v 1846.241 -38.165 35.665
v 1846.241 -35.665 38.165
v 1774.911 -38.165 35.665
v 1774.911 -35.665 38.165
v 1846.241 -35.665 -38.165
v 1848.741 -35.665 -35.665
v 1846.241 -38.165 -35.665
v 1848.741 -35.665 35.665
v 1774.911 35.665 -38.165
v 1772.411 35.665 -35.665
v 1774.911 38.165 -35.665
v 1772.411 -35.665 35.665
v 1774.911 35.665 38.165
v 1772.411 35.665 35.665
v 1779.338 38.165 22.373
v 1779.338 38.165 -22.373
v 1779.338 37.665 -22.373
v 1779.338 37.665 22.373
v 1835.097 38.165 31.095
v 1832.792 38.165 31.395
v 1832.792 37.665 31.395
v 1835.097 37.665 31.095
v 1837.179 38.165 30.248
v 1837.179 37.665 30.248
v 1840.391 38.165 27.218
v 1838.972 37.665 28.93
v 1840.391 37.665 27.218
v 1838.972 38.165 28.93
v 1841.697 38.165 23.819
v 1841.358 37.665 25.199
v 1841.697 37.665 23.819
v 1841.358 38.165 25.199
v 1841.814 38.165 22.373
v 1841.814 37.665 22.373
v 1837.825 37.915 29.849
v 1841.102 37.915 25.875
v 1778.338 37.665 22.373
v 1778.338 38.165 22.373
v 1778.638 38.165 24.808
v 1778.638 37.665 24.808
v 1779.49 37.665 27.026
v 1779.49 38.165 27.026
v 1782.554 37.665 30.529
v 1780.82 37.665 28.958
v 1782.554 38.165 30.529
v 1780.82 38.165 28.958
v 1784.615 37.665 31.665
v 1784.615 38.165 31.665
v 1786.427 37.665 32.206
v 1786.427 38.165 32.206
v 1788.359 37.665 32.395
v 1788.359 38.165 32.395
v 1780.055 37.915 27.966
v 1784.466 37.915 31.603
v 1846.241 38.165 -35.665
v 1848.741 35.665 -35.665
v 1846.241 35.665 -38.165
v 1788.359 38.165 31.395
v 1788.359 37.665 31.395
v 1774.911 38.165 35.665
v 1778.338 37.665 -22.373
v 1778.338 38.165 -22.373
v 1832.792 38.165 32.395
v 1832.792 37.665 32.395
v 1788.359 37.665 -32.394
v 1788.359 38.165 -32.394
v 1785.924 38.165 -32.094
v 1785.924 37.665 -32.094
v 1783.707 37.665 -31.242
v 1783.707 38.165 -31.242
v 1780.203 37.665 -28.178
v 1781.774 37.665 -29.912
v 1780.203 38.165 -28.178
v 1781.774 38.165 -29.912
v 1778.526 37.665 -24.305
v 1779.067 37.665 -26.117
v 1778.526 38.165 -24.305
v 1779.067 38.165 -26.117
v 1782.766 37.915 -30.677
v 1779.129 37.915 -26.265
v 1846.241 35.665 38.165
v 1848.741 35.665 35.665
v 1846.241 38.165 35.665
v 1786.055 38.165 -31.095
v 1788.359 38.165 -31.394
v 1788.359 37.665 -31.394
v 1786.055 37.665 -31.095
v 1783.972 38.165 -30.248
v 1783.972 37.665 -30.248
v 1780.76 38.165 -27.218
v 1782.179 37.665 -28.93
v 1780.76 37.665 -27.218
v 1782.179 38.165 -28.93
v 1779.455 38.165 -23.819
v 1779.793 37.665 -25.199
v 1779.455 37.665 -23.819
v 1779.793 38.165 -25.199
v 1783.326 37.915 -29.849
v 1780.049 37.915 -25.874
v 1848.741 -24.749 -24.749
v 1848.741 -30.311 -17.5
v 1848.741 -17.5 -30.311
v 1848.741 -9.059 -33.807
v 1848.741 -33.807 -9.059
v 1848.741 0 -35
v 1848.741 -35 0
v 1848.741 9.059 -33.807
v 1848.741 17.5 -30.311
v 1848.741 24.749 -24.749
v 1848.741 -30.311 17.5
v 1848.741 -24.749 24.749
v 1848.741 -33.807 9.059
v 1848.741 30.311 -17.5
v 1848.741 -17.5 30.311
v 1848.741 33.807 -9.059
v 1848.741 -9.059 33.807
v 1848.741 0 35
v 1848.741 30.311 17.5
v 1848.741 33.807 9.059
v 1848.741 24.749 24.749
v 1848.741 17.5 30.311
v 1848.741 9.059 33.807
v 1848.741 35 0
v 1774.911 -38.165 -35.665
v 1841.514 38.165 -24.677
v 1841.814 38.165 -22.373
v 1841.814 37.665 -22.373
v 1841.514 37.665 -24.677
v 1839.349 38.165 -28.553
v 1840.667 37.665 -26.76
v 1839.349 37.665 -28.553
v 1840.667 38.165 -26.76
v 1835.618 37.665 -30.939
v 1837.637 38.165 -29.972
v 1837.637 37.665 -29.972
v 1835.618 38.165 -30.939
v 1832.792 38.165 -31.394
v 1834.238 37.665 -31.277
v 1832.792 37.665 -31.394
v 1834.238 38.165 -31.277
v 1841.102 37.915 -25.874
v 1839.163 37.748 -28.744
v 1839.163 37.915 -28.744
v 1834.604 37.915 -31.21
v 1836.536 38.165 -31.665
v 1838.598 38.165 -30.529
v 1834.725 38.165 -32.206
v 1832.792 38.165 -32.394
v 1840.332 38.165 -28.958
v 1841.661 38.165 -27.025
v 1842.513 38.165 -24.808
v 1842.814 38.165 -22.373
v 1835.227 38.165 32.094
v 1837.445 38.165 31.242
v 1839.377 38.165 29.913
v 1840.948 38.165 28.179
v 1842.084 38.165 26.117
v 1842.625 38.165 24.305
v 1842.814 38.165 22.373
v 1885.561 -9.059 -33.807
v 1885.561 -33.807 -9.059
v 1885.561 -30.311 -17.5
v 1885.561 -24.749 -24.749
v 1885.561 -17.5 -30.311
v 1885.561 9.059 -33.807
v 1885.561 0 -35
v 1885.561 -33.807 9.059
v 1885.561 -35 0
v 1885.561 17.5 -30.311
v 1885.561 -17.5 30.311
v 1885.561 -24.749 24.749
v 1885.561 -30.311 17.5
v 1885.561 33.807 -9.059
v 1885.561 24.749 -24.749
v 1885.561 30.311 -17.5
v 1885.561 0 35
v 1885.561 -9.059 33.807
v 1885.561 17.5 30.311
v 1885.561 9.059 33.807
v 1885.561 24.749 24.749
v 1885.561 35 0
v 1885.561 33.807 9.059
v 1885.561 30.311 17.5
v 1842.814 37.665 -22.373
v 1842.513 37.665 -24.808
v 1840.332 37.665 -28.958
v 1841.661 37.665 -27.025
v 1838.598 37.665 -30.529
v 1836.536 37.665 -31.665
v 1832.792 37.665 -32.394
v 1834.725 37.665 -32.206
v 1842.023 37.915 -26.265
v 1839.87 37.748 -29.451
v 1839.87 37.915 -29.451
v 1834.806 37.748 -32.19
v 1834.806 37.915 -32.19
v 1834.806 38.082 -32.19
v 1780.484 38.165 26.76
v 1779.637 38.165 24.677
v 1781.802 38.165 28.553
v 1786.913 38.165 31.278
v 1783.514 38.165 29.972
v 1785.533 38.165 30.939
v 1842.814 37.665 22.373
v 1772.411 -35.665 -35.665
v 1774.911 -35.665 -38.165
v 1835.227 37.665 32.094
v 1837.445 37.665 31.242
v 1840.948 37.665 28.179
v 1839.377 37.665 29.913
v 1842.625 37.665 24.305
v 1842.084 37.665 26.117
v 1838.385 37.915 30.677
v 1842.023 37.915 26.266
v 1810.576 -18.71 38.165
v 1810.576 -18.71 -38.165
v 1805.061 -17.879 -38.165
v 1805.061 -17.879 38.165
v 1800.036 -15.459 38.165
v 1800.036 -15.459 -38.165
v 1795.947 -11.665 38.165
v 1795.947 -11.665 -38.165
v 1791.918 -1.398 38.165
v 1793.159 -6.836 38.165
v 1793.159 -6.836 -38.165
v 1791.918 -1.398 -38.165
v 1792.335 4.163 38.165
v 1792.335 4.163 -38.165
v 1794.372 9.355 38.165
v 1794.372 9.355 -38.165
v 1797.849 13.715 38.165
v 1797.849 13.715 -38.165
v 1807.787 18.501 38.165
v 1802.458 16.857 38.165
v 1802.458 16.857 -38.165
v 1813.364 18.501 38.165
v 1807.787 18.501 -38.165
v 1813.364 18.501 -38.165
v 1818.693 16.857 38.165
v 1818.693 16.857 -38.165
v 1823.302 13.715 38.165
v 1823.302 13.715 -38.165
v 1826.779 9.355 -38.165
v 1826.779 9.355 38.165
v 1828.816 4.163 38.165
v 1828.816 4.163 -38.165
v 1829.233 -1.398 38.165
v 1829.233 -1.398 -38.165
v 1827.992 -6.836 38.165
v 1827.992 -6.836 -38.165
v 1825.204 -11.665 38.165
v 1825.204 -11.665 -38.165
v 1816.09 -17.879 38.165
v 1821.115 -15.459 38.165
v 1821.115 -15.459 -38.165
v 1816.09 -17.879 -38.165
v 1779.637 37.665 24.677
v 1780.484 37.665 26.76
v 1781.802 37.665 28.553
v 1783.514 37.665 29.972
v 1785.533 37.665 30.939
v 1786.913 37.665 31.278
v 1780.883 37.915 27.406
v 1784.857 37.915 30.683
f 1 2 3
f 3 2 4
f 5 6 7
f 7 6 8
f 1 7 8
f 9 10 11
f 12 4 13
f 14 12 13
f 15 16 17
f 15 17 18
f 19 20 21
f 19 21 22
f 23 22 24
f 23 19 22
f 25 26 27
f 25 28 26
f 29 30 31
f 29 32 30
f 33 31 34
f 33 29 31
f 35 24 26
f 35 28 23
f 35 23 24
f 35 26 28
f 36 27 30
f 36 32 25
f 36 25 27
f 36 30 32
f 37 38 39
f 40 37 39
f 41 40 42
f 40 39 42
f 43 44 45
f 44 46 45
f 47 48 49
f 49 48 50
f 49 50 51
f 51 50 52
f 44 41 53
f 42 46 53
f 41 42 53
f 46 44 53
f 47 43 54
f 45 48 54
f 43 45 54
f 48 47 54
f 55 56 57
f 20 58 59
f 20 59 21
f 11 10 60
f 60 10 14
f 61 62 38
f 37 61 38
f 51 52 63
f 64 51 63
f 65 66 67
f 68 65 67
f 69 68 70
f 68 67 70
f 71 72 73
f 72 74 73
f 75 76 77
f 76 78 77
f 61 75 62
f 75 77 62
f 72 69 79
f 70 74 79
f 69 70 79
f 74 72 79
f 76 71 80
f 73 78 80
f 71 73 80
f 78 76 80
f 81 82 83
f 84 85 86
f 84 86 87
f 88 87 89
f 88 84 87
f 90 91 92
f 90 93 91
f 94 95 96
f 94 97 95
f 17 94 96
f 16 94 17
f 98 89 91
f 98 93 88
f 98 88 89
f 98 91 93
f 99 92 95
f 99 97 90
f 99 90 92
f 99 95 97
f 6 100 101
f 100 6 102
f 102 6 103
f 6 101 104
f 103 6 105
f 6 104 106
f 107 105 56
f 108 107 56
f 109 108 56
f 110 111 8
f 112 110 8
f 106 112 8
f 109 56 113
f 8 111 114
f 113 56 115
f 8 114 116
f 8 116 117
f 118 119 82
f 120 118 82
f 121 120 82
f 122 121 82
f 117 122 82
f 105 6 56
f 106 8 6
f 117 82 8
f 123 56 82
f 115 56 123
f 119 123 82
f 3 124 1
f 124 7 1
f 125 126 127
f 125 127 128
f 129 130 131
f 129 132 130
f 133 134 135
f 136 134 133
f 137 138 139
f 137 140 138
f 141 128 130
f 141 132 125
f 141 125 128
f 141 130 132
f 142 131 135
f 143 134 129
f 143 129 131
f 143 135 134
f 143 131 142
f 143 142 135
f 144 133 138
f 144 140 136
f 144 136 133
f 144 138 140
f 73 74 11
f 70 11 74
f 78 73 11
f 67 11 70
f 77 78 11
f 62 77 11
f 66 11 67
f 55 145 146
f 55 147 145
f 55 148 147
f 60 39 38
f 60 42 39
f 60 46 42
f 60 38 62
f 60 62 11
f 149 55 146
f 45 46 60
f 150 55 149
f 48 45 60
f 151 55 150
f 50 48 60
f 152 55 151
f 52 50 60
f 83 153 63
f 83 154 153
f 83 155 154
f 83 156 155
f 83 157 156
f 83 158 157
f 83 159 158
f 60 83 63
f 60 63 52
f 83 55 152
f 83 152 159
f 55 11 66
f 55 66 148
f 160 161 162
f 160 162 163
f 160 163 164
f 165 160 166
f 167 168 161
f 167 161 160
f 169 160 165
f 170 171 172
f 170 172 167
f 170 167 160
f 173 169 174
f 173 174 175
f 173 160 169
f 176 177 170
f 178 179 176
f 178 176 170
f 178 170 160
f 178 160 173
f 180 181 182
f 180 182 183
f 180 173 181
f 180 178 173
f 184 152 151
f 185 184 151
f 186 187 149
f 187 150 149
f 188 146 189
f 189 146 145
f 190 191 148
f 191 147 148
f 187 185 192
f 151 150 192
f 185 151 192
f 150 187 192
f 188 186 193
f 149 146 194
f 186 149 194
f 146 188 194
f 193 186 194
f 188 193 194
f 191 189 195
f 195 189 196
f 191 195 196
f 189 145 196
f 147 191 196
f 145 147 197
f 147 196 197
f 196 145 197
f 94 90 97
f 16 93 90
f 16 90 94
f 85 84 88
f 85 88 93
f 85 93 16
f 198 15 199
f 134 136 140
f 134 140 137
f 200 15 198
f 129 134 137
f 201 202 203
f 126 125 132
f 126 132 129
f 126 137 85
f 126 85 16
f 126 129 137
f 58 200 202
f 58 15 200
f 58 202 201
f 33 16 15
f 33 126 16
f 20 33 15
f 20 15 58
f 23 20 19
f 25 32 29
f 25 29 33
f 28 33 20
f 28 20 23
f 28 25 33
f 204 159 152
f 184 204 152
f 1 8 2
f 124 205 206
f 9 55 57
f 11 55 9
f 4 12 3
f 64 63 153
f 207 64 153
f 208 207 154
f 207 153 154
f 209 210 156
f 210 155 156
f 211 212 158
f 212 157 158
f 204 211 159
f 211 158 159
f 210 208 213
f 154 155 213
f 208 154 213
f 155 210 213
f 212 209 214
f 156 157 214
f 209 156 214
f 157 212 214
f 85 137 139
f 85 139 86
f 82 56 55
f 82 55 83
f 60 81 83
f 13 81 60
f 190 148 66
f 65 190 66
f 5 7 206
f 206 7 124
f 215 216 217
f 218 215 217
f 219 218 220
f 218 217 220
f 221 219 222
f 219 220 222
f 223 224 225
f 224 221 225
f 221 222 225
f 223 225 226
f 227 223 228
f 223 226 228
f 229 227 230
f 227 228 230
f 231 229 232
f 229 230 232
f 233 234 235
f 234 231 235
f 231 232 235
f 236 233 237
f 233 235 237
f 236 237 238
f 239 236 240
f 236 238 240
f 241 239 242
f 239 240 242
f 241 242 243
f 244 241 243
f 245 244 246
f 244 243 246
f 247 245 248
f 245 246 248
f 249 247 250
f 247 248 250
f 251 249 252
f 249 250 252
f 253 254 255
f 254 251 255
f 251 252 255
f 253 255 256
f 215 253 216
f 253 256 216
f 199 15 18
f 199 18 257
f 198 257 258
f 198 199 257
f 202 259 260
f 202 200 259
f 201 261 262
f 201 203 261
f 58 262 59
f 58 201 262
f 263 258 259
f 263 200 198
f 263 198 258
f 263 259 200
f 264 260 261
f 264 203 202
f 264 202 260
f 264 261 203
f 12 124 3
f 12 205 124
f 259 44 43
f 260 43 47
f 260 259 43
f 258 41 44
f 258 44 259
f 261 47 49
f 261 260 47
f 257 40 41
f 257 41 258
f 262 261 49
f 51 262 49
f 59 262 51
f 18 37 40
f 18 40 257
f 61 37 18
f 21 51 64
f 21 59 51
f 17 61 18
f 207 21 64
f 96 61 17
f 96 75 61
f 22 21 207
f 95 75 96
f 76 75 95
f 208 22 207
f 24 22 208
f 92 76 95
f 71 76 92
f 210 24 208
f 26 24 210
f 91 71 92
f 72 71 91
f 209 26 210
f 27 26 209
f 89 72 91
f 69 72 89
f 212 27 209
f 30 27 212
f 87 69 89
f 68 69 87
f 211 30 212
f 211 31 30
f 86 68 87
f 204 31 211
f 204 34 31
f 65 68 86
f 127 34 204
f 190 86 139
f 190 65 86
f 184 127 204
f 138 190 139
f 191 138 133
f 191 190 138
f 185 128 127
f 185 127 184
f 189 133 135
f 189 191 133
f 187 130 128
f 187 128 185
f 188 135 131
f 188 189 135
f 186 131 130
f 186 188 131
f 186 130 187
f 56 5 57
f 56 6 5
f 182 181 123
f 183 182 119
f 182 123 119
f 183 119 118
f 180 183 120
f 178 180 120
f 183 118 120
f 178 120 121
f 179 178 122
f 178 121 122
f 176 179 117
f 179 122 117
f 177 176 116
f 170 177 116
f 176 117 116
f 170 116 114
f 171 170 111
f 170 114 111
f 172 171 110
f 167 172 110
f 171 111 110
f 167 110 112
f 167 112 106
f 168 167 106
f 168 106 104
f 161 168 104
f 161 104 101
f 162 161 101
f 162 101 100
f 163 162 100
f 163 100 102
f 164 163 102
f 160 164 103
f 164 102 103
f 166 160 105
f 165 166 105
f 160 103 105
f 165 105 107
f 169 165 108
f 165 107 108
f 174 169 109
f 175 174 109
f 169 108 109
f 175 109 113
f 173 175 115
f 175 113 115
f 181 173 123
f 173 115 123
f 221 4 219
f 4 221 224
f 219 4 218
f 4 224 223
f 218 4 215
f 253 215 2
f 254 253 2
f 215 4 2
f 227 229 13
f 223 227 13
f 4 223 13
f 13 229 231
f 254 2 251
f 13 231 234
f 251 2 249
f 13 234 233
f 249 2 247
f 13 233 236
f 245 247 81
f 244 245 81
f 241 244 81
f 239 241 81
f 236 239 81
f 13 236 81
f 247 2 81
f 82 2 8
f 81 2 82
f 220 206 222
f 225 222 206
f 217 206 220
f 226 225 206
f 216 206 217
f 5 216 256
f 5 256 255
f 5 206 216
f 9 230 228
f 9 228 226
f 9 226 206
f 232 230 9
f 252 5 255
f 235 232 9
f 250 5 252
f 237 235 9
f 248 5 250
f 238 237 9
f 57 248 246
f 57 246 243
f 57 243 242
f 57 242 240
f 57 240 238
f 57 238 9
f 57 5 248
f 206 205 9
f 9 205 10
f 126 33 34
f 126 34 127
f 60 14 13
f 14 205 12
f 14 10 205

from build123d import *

# Parameters (mm, degrees)
SKETCH1_W           = 76.33
SKETCH1_H           = 76.33
BOSS_EXTRUDE1_DEPTH = 76.33
SKETCH2_R           = 35
BOSS_EXTRUDE2_DEPTH = 36.82
CHAMFER1_SIZE       = 2.5
CUT_EXTRUDE1_REACH  = 1889.491
CUT_EXTRUDE2_DEPTH  = 0.5


with BuildPart() as part:
    # Sketch1 → Boss-Extrude1 (new body)
    with BuildSketch(Plane.ZY.offset(-1848.740517551)):
        Rectangle(SKETCH1_W, SKETCH1_H)
    extrude(amount=BOSS_EXTRUDE1_DEPTH)

    # Sketch2 → Boss-Extrude2 (add)
    with BuildSketch(Plane(origin=(1848.740517551, 0, 0), x_dir=(0, 0, -1), z_dir=(1, 0, 0))):
        with Locations(Location((0, 0, 0), (0, 0, 90))):
            Circle(SKETCH2_R)
    extrude(amount=BOSS_EXTRUDE2_DEPTH)

    # Chamfer1
    chamfer1_edges = [part.edges().sort_by_distance(p)[0] for p in [
        (1772.410517551, -38.165, 0),
        (1772.410517551, 0, -38.165),
        (1772.410517551, 38.165, 0),
        (1848.740517551, 0, -38.165),
        (1848.740517551, -38.165, 0),
        (1848.740517551, 0, 38.165),
        (1848.740517551, 38.165, 0),
        (1772.410517551, 0, 38.165),
        (1810.575517551, 38.165, -38.165),
        (1810.575517551, -38.165, -38.165),
        (1810.575517551, -38.165, 38.165),
        (1810.575517551, 38.165, 38.165),
    ]]
    chamfer(chamfer1_edges, length=CHAMFER1_SIZE)

    # Sketch3 → Cut-Extrude1 (cut, up to next)
    with BuildSketch(Plane(origin=(0, 0, -38.165), x_dir=(-1, 0, 0), z_dir=(0, 0, -1)), mode=Mode.PRIVATE) as cut_extrude1_sk1:
        with BuildLine():
            ThreePointArc((-1791.865517551, 0), (-1797.345549675, 13.229967876), (-1810.575517551, 18.71))
            Line((-1810.575517551, 18.71), (-1810.575517551, -18.71))
            ThreePointArc((-1810.575517551, -18.71), (-1797.345549675, -13.229967876), (-1791.865517551, 0))
        make_face()
    cut_extrude1_tool1 = extrude(cut_extrude1_sk1.sketch, amount=-CUT_EXTRUDE1_REACH, mode=Mode.PRIVATE) & part.part
    # Sketch3 → Cut-Extrude1 (cut, up to next)
    with BuildSketch(Plane(origin=(0, 0, -38.165), x_dir=(-1, 0, 0), z_dir=(0, 0, -1)), mode=Mode.PRIVATE) as cut_extrude1_sk2:
        with BuildLine():
            Line((-1810.575517551, -18.71), (-1810.575517551, 18.71))
            ThreePointArc((-1810.575517551, 18.71), (-1829.285517551, 0), (-1810.575517551, -18.71))
        make_face()
    cut_extrude1_tool2 = extrude(cut_extrude1_sk2.sketch, amount=-CUT_EXTRUDE1_REACH, mode=Mode.PRIVATE) & part.part
    # Sketch3 → Cut-Extrude1 (cut, up to next)
    with BuildSketch(Plane(origin=(0, 0, -38.165), x_dir=(-1, 0, 0), z_dir=(0, 0, -1)), mode=Mode.PRIVATE) as cut_extrude1_sk3:
        with BuildLine():
            ThreePointArc((-1791.865517551, 0), (-1797.345549675, 13.229967876), (-1810.575517551, 18.71))
            Line((-1810.575517551, 18.71), (-1810.575517551, -18.71))
            ThreePointArc((-1810.575517551, -18.71), (-1797.345549675, -13.229967876), (-1791.865517551, 0))
        make_face()
    cut_extrude1_tool3 = extrude(cut_extrude1_sk3.sketch, amount=-CUT_EXTRUDE1_REACH, mode=Mode.PRIVATE) & part.part
    # Sketch3 → Cut-Extrude1 (cut, up to next)
    with BuildSketch(Plane(origin=(0, 0, -38.165), x_dir=(-1, 0, 0), z_dir=(0, 0, -1)), mode=Mode.PRIVATE) as cut_extrude1_sk4:
        with BuildLine():
            Line((-1810.575517551, -18.71), (-1810.575517551, 18.71))
            ThreePointArc((-1810.575517551, 18.71), (-1829.285517551, 0), (-1810.575517551, -18.71))
        make_face()
    cut_extrude1_tool4 = extrude(cut_extrude1_sk4.sketch, amount=-CUT_EXTRUDE1_REACH, mode=Mode.PRIVATE) & part.part
    add(cut_extrude1_tool1.solids().sort_by_distance((1802.634747, 0, -38.165))[0], mode=Mode.SUBTRACT)
    add(cut_extrude1_tool2.solids().sort_by_distance((1818.516288, 0, -38.165))[0], mode=Mode.SUBTRACT)
    add(cut_extrude1_tool3.solids().sort_by_distance((1802.634747, 0, -38.165))[0], mode=Mode.SUBTRACT)
    add(cut_extrude1_tool4.solids().sort_by_distance((1818.516288, 0, -38.165))[0], mode=Mode.SUBTRACT)

    # Sketch5 → Cut-Extrude2 (cut)
    with BuildSketch(Plane(origin=(0, 38.165, 0), x_dir=(1, 0, 0), z_dir=(0, 1, 0))):
        with BuildLine():
            Line((1788.358917551, -32.3946), (1832.792217551, -32.3946))
            add(Edge.make_bspline(
                [(1832.792217551, -32.3946), (1833.466855861, -32.3946), (1834.834608919, -32.253703608), (1837.339344692, -31.462150857), (1840.043615022, -29.624585418), (1841.881171353, -26.92029094), (1842.672721425, -24.415524634), (1842.813617551, -23.047748692), (1842.813617551, -22.3731)],
                knots=[0.555555556, 0.555555556, 0.555555556, 0.555555556, 0.569444444, 0.583333333, 0.611111111, 0.638888889, 0.652777778, 0.666666667, 0.666666667, 0.666666667, 0.666666667], degree=3))
            Line((1842.813617551, -22.3731), (1842.813617551, 22.373))
            add(Edge.make_bspline(
                [(1842.813617551, 22.373), (1842.813617551, 23.047629093), (1842.672720901, 24.415360154), (1841.881169744, 26.92007933), (1840.043614741, 29.624353237), (1837.339347144, 31.46193401), (1834.834610984, 32.25350014), (1833.466856595, 32.3944), (1832.792217551, 32.3944)],
                knots=[0.777777778, 0.777777778, 0.777777778, 0.777777778, 0.805555556, 0.833333333, 0.888888889, 0.944444444, 0.972222222, 1, 1, 1, 1], degree=3))
            Line((1832.792217551, 32.3944), (1788.358917551, 32.3944))
            add(Edge.make_bspline(
                [(1788.358917551, 32.3944), (1787.684278508, 32.3944), (1786.316524118, 32.25350014), (1783.811787958, 31.46193401), (1781.107520362, 29.624353237), (1779.269965358, 26.92007933), (1778.478414202, 24.415360154), (1778.337517551, 23.047629093), (1778.337517551, 22.373)],
                knots=[0.111111111, 0.111111111, 0.111111111, 0.111111111, 0.125, 0.138888889, 0.166666667, 0.194444444, 0.208333333, 0.222222222, 0.222222222, 0.222222222, 0.222222222], degree=3))
            Line((1778.337517551, 22.373), (1778.337517551, -22.3731))
            add(Edge.make_bspline(
                [(1778.337517551, -22.3731), (1778.337517551, -23.047748692), (1778.478413677, -24.415524634), (1779.269963749, -26.92029094), (1781.107520081, -29.624585418), (1783.81179041, -31.462150857), (1786.316526183, -32.253703608), (1787.684279242, -32.3946), (1788.358917551, -32.3946)],
                knots=[0.333333333, 0.333333333, 0.333333333, 0.333333333, 0.347222222, 0.361111111, 0.388888889, 0.416666667, 0.430555556, 0.444444444, 0.444444444, 0.444444444, 0.444444444], degree=3))
        make_face()
        with BuildLine():
            Line((1788.358917551, -31.3946), (1832.792217551, -31.3946))
            add(Edge.make_bspline(
                [(1832.792217551, -31.3946), (1833.399248628, -31.3946), (1834.630365029, -31.267771469), (1836.881569909, -30.556358134), (1839.319622864, -28.900598899), (1840.975375901, -26.462522118), (1841.686788747, -24.211284373), (1841.813617551, -22.980142574), (1841.813617551, -22.3731)],
                knots=[0.555555556, 0.555555556, 0.555555556, 0.555555556, 0.569444444, 0.583333333, 0.611111111, 0.638888889, 0.652777778, 0.666666667, 0.666666667, 0.666666667, 0.666666667], degree=3))
            Line((1841.813617551, -22.3731), (1841.813617551, 22.373))
            add(Edge.make_bspline(
                [(1841.813617551, 22.373), (1841.813617551, 22.980021237), (1841.686789271, 24.211113504), (1840.975377513, 26.462304848), (1839.319623121, 28.900367756), (1836.881567526, 30.556143835), (1834.630362845, 31.267568666), (1833.399248157, 31.3944), (1832.792217551, 31.3944)],
                knots=[0.777777778, 0.777777778, 0.777777778, 0.777777778, 0.805555556, 0.833333333, 0.888888889, 0.944444444, 0.972222222, 1, 1, 1, 1], degree=3))
            Line((1832.792217551, 31.3944), (1788.358917551, 31.3944))
            add(Edge.make_bspline(
                [(1788.358917551, 31.3944), (1787.751886946, 31.3944), (1786.520772257, 31.267568666), (1784.269567577, 30.556143835), (1781.831511982, 28.900367756), (1780.175757589, 26.462304848), (1779.464345832, 24.211113504), (1779.337517551, 22.980021237), (1779.337517551, 22.373)],
                knots=[0.111111111, 0.111111111, 0.111111111, 0.111111111, 0.125, 0.138888889, 0.166666667, 0.194444444, 0.208333333, 0.222222222, 0.222222222, 0.222222222, 0.222222222], degree=3))
            Line((1779.337517551, 22.373), (1779.337517551, -22.3731))
            add(Edge.make_bspline(
                [(1779.337517551, -22.3731), (1779.337517551, -22.980142574), (1779.464346356, -24.211284373), (1780.175759201, -26.462522118), (1781.831512239, -28.900598899), (1784.269565194, -30.556358134), (1786.520770074, -31.267771469), (1787.751886474, -31.3946), (1788.358917551, -31.3946)],
                knots=[0.333333333, 0.333333333, 0.333333333, 0.333333333, 0.347222222, 0.361111111, 0.388888889, 0.416666667, 0.430555556, 0.444444444, 0.444444444, 0.444444444, 0.444444444], degree=3))
        make_face(mode=Mode.SUBTRACT)
    extrude(amount=-CUT_EXTRUDE2_DEPTH, mode=Mode.SUBTRACT)


solid = part.part
